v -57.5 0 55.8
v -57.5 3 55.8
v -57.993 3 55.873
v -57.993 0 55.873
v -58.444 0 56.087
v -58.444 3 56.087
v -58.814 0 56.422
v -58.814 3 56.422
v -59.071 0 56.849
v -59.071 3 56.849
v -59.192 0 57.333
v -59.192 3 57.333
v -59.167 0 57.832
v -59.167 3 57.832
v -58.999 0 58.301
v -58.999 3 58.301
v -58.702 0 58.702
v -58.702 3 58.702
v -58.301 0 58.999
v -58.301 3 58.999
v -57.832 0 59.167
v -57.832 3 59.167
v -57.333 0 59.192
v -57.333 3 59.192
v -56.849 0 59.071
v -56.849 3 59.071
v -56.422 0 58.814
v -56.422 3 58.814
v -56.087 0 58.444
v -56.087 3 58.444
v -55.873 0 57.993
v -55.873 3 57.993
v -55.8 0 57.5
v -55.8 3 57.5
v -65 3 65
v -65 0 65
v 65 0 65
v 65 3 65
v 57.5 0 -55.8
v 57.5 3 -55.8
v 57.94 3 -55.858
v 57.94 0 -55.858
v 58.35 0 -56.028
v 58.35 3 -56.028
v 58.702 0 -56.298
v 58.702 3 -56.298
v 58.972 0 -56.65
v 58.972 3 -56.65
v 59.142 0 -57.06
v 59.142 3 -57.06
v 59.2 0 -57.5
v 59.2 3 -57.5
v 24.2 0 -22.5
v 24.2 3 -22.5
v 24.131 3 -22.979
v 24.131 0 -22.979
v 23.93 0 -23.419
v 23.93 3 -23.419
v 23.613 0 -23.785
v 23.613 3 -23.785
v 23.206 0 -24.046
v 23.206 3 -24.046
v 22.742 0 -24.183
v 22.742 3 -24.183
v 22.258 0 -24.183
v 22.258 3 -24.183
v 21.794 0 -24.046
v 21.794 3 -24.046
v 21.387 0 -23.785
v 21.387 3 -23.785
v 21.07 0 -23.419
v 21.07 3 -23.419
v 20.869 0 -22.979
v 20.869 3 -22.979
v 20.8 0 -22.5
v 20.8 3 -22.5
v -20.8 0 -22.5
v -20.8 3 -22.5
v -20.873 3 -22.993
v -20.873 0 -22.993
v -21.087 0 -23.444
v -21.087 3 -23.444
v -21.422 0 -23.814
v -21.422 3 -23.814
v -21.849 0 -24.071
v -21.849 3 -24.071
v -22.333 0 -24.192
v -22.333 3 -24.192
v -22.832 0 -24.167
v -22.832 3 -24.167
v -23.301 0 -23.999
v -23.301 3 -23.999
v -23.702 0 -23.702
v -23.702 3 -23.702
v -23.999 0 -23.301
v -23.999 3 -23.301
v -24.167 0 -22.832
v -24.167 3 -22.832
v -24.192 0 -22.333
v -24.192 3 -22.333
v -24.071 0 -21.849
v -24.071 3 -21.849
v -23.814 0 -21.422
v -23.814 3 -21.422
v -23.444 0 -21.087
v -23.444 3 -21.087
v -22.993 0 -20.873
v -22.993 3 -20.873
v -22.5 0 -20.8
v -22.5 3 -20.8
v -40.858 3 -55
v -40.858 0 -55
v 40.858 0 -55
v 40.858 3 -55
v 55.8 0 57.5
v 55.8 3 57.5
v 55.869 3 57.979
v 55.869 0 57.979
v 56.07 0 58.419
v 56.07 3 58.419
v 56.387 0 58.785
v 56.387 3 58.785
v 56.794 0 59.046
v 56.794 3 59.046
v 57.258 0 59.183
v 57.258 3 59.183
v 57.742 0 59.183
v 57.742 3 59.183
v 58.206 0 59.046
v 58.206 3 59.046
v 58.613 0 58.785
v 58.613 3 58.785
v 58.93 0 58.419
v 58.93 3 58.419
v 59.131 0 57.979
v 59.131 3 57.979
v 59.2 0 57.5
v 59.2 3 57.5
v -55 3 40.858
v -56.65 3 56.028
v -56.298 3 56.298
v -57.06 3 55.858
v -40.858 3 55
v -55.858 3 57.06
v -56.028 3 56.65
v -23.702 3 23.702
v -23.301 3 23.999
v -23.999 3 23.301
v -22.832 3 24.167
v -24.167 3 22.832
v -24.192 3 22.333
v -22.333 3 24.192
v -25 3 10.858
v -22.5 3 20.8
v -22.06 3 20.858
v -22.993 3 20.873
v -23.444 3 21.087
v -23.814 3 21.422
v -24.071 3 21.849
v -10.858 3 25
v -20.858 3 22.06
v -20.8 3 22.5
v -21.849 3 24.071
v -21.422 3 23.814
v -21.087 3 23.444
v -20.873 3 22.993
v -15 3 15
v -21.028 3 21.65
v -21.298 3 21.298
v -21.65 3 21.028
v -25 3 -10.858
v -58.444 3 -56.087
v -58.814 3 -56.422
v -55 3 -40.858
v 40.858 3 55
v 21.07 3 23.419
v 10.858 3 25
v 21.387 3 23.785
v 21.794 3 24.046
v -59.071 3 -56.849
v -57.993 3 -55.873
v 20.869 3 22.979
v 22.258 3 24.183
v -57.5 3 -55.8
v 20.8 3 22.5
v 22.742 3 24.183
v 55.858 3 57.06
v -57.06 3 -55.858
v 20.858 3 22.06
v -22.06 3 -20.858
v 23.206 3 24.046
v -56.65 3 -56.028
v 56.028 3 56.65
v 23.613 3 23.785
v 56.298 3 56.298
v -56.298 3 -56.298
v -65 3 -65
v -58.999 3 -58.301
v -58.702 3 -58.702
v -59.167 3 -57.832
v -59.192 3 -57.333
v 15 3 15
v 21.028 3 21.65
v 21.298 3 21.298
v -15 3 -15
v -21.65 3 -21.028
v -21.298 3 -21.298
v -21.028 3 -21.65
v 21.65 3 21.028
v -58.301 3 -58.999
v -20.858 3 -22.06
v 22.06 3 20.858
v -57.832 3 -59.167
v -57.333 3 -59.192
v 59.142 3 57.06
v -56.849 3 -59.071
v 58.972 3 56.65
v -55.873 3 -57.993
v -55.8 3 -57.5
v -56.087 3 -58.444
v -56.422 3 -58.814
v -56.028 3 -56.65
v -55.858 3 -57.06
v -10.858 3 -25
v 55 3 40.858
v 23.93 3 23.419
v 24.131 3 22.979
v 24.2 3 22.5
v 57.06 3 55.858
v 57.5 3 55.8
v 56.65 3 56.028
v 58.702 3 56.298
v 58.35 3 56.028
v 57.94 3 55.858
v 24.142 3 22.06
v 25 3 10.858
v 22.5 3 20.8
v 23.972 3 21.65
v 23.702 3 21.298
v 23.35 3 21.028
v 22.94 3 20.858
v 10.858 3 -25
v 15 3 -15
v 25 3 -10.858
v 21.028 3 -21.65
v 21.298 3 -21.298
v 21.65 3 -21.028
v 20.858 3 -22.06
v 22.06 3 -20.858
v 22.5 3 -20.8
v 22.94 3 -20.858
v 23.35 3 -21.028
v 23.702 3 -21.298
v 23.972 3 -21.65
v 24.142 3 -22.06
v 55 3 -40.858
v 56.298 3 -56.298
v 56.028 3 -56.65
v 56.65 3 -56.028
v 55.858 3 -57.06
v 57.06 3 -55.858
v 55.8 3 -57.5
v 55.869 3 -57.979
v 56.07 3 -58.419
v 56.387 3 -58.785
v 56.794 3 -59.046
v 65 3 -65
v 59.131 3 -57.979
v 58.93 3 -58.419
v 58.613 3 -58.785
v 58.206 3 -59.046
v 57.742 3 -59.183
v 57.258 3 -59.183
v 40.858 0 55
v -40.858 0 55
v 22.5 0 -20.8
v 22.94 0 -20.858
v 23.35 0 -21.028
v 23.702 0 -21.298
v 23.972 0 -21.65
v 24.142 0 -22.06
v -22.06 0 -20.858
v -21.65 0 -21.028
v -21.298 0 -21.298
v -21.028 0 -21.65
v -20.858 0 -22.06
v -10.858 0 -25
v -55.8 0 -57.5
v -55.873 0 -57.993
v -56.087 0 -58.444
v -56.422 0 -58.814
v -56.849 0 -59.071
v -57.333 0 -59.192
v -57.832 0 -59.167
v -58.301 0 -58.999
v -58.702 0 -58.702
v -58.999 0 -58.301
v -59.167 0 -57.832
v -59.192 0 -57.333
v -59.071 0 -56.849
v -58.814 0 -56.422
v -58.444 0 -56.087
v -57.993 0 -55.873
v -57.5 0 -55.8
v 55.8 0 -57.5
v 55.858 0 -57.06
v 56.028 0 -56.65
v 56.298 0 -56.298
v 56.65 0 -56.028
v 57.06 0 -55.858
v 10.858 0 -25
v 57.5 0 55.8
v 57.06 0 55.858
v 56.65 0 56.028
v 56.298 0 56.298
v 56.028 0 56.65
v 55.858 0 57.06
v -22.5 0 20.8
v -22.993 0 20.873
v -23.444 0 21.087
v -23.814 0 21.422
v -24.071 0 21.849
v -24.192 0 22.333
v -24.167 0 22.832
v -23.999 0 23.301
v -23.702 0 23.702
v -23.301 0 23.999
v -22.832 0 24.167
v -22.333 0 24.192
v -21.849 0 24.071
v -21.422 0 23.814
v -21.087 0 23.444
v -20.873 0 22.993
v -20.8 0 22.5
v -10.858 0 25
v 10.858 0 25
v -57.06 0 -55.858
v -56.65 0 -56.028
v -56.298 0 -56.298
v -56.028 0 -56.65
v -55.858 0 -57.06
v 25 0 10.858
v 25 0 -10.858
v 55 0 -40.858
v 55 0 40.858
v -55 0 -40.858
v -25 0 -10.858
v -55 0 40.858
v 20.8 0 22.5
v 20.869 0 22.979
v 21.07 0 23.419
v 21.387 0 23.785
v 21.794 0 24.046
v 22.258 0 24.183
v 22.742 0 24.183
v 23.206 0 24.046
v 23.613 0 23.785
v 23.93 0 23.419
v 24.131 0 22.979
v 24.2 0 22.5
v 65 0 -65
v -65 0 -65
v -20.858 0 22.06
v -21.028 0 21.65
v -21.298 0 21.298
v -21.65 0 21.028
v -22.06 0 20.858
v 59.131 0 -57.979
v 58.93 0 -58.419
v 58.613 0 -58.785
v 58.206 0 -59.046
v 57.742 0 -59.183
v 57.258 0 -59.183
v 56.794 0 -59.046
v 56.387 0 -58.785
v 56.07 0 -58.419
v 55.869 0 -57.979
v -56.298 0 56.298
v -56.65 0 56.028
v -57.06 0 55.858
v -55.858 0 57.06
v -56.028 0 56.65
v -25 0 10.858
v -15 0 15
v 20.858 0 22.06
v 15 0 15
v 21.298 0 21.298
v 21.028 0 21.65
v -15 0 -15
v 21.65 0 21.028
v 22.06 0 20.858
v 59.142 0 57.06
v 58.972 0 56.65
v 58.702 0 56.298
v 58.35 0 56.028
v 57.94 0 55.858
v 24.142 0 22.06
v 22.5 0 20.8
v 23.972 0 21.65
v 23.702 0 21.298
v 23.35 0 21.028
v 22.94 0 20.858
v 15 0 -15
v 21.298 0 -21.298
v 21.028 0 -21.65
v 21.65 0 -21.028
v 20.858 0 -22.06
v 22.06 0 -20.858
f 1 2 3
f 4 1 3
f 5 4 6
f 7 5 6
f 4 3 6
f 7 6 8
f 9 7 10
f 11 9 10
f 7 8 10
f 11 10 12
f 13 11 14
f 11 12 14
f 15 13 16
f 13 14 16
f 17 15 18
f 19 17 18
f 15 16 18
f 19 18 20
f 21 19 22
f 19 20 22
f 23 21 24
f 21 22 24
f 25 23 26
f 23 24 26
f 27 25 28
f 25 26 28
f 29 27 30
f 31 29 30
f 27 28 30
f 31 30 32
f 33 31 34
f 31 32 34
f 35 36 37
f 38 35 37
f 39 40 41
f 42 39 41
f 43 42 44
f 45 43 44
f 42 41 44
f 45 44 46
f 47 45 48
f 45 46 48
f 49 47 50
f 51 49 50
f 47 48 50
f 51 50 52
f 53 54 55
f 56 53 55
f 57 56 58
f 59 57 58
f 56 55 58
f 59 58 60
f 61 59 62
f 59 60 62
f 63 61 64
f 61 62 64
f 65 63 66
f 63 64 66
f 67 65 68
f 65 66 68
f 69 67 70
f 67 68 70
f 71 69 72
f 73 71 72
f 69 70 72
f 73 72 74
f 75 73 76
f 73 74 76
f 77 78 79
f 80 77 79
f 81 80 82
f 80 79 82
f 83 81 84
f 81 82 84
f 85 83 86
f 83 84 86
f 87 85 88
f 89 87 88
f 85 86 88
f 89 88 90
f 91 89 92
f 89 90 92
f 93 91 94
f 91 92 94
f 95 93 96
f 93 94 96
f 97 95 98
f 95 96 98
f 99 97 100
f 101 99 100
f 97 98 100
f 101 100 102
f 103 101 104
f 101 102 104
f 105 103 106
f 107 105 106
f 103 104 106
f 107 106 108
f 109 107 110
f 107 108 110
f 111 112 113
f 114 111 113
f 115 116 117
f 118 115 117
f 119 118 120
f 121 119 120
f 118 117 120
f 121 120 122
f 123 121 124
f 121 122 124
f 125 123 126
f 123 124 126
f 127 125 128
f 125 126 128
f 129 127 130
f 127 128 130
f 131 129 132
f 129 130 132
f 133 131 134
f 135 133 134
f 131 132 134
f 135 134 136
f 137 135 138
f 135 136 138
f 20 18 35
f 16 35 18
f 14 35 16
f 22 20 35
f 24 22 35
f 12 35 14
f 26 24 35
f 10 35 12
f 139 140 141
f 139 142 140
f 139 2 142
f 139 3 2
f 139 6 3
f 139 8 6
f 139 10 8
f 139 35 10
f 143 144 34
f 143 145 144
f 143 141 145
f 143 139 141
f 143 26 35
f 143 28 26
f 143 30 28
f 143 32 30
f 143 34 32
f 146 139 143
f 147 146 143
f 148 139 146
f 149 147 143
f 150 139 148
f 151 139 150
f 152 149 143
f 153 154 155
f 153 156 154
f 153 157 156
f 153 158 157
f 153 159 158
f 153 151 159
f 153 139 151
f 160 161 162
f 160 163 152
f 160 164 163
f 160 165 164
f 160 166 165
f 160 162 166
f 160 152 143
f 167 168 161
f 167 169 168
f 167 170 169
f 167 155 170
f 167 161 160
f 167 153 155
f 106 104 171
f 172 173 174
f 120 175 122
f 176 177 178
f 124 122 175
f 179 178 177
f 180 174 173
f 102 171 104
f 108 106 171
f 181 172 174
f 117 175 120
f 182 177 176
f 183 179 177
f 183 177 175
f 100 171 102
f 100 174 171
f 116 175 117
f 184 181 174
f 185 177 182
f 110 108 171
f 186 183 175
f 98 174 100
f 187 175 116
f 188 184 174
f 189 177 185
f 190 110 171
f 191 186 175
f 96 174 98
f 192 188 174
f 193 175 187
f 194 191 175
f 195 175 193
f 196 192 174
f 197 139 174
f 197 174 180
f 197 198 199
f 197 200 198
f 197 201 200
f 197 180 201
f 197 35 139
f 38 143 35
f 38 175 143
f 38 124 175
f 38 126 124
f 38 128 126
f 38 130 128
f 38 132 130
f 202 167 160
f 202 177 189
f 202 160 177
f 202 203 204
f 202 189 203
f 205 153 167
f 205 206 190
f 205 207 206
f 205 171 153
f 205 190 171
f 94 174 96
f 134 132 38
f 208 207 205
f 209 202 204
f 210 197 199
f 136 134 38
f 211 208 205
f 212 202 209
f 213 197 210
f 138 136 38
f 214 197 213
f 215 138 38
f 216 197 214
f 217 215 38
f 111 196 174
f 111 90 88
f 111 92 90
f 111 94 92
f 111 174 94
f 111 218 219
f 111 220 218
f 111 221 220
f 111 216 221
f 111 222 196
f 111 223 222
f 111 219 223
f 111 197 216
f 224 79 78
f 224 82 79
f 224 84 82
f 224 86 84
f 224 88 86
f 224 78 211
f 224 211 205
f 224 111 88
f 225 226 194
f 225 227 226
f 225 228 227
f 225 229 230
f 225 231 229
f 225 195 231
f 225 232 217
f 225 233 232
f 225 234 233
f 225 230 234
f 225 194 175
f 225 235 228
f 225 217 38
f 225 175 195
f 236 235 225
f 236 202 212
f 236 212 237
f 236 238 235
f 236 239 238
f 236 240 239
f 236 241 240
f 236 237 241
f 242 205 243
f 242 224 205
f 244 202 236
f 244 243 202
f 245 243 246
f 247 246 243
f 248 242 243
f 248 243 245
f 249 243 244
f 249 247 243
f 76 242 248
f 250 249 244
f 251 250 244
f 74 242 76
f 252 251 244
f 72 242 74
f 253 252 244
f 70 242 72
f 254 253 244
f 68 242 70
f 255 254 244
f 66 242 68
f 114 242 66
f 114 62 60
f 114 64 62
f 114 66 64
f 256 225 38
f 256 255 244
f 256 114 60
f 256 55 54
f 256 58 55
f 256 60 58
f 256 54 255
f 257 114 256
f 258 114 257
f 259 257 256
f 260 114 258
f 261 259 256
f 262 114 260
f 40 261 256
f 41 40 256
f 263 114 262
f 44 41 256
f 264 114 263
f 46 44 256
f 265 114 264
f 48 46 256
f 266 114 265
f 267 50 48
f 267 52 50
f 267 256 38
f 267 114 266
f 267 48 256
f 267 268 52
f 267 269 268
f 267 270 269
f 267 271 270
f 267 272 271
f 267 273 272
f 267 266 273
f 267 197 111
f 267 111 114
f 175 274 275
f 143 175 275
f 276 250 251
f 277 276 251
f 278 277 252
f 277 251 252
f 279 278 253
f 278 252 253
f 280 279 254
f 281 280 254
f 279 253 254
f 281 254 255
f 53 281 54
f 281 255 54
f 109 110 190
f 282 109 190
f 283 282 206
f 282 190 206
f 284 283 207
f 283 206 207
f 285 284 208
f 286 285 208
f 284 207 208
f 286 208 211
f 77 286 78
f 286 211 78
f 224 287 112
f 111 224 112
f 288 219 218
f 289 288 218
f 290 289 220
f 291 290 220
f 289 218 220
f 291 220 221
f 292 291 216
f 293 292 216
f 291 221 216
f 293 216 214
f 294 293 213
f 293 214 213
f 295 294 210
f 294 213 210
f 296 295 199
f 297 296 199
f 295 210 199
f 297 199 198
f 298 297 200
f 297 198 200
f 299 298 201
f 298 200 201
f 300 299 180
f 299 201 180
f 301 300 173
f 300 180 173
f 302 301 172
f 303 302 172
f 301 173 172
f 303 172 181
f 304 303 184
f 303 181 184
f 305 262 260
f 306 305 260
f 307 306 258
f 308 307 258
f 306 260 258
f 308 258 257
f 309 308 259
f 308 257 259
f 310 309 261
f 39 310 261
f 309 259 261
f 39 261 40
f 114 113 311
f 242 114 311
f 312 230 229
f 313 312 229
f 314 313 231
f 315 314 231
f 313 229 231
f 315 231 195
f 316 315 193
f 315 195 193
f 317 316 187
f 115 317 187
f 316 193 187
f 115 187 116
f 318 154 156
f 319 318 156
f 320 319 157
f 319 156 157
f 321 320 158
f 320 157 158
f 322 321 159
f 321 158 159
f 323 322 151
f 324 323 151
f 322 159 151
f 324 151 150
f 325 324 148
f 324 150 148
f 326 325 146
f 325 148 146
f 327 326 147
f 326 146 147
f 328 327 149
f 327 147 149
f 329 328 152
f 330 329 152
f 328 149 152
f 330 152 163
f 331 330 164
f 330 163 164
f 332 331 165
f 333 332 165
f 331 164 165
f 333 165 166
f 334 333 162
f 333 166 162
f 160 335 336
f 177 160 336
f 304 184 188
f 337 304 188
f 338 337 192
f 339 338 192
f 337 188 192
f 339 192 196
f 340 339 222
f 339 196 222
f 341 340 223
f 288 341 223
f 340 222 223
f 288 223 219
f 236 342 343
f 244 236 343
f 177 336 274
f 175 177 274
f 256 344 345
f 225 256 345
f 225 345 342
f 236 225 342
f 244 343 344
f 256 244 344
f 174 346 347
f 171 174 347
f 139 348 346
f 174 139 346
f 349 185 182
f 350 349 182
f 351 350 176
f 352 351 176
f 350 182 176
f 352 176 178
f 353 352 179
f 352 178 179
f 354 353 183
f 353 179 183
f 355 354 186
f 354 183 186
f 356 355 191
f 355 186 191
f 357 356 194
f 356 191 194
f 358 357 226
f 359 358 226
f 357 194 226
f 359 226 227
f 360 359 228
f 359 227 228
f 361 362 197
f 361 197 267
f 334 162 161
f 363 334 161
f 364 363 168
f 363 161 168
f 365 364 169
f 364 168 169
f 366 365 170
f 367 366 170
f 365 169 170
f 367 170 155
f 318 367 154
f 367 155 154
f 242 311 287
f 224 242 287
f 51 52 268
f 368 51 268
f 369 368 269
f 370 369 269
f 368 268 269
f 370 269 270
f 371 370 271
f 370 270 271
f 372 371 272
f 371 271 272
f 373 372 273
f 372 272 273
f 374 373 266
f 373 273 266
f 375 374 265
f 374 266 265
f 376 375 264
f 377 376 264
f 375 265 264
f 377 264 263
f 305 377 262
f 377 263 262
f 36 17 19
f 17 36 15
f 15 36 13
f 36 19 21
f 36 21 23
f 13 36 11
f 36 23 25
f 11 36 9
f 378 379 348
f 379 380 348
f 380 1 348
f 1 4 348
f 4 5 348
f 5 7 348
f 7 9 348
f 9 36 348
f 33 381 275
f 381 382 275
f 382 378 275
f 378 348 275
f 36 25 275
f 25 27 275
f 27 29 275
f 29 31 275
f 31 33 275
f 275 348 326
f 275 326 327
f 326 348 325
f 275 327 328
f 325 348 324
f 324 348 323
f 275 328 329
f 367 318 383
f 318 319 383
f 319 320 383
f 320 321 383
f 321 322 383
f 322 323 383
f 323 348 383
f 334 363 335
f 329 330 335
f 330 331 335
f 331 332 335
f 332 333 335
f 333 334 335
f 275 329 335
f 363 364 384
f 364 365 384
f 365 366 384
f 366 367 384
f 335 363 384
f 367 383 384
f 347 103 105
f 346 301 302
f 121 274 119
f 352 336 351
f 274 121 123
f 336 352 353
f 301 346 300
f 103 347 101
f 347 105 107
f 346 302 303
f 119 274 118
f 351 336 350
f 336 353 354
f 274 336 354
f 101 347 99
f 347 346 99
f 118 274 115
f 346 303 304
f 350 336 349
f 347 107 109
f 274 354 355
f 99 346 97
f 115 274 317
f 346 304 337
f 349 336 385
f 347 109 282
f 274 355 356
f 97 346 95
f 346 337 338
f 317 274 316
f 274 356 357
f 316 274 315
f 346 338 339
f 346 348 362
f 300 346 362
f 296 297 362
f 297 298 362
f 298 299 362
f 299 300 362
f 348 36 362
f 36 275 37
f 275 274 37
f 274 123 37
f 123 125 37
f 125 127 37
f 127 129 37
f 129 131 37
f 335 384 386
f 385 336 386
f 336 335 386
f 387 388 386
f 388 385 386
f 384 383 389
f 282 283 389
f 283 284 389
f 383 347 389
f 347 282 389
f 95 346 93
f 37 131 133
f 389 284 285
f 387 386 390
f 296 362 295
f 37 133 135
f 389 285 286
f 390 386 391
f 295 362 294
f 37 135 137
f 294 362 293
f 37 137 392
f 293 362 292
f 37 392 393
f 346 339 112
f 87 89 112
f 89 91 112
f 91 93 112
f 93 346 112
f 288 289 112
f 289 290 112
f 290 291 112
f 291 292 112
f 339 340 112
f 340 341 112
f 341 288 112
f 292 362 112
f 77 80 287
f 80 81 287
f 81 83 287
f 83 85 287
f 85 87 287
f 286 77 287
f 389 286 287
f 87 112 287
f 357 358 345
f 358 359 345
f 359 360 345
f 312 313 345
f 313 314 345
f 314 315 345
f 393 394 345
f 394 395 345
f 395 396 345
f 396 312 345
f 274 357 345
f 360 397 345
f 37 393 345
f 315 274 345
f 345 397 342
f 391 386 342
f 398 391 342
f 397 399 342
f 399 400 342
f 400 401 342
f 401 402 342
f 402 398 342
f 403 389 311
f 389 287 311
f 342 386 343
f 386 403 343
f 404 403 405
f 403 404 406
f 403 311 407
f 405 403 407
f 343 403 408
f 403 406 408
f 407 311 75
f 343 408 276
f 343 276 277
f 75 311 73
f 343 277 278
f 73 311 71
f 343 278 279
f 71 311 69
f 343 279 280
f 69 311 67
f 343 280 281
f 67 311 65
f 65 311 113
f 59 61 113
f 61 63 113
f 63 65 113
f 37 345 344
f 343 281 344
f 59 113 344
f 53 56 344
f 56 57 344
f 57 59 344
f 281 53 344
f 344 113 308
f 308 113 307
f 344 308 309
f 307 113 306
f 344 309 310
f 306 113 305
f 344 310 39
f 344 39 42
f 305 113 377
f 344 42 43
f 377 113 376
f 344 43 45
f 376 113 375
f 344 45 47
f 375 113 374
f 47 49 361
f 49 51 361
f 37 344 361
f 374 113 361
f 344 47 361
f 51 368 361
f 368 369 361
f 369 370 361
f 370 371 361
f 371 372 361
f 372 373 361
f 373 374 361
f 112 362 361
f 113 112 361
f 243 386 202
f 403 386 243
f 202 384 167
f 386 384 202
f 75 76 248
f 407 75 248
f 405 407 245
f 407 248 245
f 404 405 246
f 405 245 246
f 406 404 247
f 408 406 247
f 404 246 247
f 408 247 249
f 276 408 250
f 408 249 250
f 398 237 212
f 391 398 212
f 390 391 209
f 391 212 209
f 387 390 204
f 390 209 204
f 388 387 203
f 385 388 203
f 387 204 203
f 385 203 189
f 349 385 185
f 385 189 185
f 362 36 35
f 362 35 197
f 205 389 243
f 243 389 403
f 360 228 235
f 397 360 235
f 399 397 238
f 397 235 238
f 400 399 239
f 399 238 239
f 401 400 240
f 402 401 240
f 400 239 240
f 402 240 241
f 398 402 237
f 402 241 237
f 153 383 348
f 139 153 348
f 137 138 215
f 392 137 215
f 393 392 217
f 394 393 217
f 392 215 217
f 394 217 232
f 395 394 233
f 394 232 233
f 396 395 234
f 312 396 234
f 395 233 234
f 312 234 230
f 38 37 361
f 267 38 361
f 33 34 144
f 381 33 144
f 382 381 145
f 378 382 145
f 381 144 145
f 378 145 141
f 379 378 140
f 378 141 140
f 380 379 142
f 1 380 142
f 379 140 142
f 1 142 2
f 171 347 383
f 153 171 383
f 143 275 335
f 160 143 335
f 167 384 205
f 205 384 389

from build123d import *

# Parameters (mm, degrees)
SKETCH1_W           = 130
SKETCH1_H           = 130
SKETCH1_W_2         = 30
SKETCH1_H_2         = 30
BOSS_EXTRUDE1_DEPTH = 3
CUT_EXTRUDE1_DEPTH  = 3
CUT_EXTRUDE2_DEPTH  = 3


with BuildPart() as part:
    # Sketch1 → Boss-Extrude1 (new body)
    with BuildSketch(Plane(origin=(0, 0, 0), x_dir=(1, 0, 0), z_dir=(0, 1, 0))):
        Rectangle(SKETCH1_W, SKETCH1_H)
        Polygon((-55, 40.857864376), (-25, 10.857864376), (-25, -10.857864376), (-55, -40.857864376), align=None, mode=Mode.SUBTRACT)
        Polygon((-40.857864376, -55), (-10.857864376, -25), (10.857864376, -25), (40.857864376, -55), align=None, mode=Mode.SUBTRACT)
        Polygon((55, -40.857864376), (25, -10.857864376), (25, 10.857864376), (55, 40.857864376), align=None, mode=Mode.SUBTRACT)
        Polygon((40.857864376, 55), (10.857864376, 25), (-10.857864376, 25), (-40.857864376, 55), align=None, mode=Mode.SUBTRACT)
        Rectangle(SKETCH1_W_2, SKETCH1_H_2, mode=Mode.SUBTRACT)
    extrude(amount=BOSS_EXTRUDE1_DEPTH)

    # Sketch2 → Cut-Extrude1 (cut)
    with BuildSketch(Plane(origin=(0, 3, 0), x_dir=(1, 0, 0), z_dir=(0, 1, 0))):
        with BuildLine():
            ThreePointArc((-55.8, 57.5), (-58.702081528, 58.702081528), (-57.5, 55.8))
            Line((-57.5, 55.8), (-57.5, 57.5))
            Line((-57.5, 57.5), (-55.8, 57.5))
        make_face()
        with BuildLine():
            Line((-57.5, 57.5), (-57.5, 55.8))
            ThreePointArc((-57.5, 55.8), (-56.297918472, 56.297918472), (-55.8, 57.5))
            Line((-55.8, 57.5), (-57.5, 57.5))
        make_face()
        with BuildLine():
            Line((-57.5, -55.8), (-57.5, -57.5))
            Line((-57.5, -57.5), (-55.8, -57.5))
            ThreePointArc((-55.8, -57.5), (-56.297918472, -56.297918472), (-57.5, -55.8))
        make_face()
        with BuildLine():
            Line((-55.8, -57.5), (-57.5, -57.5))
            Line((-57.5, -57.5), (-57.5, -55.8))
            ThreePointArc((-57.5, -55.8), (-58.702081528, -58.702081528), (-55.8, -57.5))
        make_face()
        with BuildLine():
            ThreePointArc((57.5, -55.8), (56.297918472, -56.297918472), (55.8, -57.5))
            Line((55.8, -57.5), (57.5, -57.5))
            Line((57.5, -57.5), (57.5, -55.8))
        make_face()
        with BuildLine():
            Line((57.5, -57.5), (55.8, -57.5))
            ThreePointArc((55.8, -57.5), (57.5, -59.2), (59.2, -57.5))
            ThreePointArc((59.2, -57.5), (58.702081528, -56.297918472), (57.5, -55.8))
            Line((57.5, -55.8), (57.5, -57.5))
        make_face()
        with BuildLine():
            ThreePointArc((55.8, 57.5), (56.297918472, 56.297918472), (57.5, 55.8))
            Line((57.5, 55.8), (57.5, 57.5))
            Line((57.5, 57.5), (55.8, 57.5))
        make_face()
        with BuildLine():
            Line((57.5, 57.5), (57.5, 55.8))
            ThreePointArc((57.5, 55.8), (58.702081528, 56.297918472), (59.2, 57.5))
            ThreePointArc((59.2, 57.5), (57.5, 59.2), (55.8, 57.5))
            Line((55.8, 57.5), (57.5, 57.5))
        make_face()
    extrude(amount=-CUT_EXTRUDE1_DEPTH, mode=Mode.SUBTRACT)

    # Sketch3 → Cut-Extrude2 (cut)
    with BuildSketch(Plane(origin=(0, 3, 0), x_dir=(1, 0, 0), z_dir=(0, 1, 0))):
        with BuildLine():
            Line((-22.5, -20.8), (-22.5, -22.5))
            Line((-22.5, -22.5), (-20.8, -22.5))
            ThreePointArc((-20.8, -22.5), (-21.297918472, -21.297918472), (-22.5, -20.8))
        make_face()
        with BuildLine():
            Line((-20.8, -22.5), (-22.5, -22.5))
            Line((-22.5, -22.5), (-22.5, -20.8))
            ThreePointArc((-22.5, -20.8), (-23.702081528, -23.702081528), (-20.8, -22.5))
        make_face()
        with BuildLine():
            ThreePointArc((-20.8, 22.5), (-23.702081528, 23.702081528), (-22.5, 20.8))
            Line((-22.5, 20.8), (-22.5, 22.5))
            Line((-22.5, 22.5), (-20.8, 22.5))
        make_face()
        with BuildLine():
            Line((-22.5, 22.5), (-22.5, 20.8))
            ThreePointArc((-22.5, 20.8), (-21.297918472, 21.297918472), (-20.8, 22.5))
            Line((-20.8, 22.5), (-22.5, 22.5))
        make_face()
        with BuildLine():
            ThreePointArc((22.5, -20.8), (21.297918472, -21.297918472), (20.8, -22.5))
            Line((20.8, -22.5), (22.5, -22.5))
            Line((22.5, -22.5), (22.5, -20.8))
        make_face()
        with BuildLine():
            Line((22.5, -22.5), (20.8, -22.5))
            ThreePointArc((20.8, -22.5), (22.5, -24.2), (24.2, -22.5))
            ThreePointArc((24.2, -22.5), (23.702081528, -21.297918472), (22.5, -20.8))
            Line((22.5, -20.8), (22.5, -22.5))
        make_face()
        with BuildLine():
            ThreePointArc((20.8, 22.5), (21.297918472, 21.297918472), (22.5, 20.8))
            Line((22.5, 20.8), (22.5, 22.5))
            Line((22.5, 22.5), (20.8, 22.5))
        make_face()
        with BuildLine():
            Line((22.5, 22.5), (22.5, 20.8))
            ThreePointArc((22.5, 20.8), (23.702081528, 21.297918472), (24.2, 22.5))
            ThreePointArc((24.2, 22.5), (22.5, 24.2), (20.8, 22.5))
            Line((20.8, 22.5), (22.5, 22.5))
        make_face()
    extrude(amount=-CUT_EXTRUDE2_DEPTH, mode=Mode.SUBTRACT)


solid = part.part
